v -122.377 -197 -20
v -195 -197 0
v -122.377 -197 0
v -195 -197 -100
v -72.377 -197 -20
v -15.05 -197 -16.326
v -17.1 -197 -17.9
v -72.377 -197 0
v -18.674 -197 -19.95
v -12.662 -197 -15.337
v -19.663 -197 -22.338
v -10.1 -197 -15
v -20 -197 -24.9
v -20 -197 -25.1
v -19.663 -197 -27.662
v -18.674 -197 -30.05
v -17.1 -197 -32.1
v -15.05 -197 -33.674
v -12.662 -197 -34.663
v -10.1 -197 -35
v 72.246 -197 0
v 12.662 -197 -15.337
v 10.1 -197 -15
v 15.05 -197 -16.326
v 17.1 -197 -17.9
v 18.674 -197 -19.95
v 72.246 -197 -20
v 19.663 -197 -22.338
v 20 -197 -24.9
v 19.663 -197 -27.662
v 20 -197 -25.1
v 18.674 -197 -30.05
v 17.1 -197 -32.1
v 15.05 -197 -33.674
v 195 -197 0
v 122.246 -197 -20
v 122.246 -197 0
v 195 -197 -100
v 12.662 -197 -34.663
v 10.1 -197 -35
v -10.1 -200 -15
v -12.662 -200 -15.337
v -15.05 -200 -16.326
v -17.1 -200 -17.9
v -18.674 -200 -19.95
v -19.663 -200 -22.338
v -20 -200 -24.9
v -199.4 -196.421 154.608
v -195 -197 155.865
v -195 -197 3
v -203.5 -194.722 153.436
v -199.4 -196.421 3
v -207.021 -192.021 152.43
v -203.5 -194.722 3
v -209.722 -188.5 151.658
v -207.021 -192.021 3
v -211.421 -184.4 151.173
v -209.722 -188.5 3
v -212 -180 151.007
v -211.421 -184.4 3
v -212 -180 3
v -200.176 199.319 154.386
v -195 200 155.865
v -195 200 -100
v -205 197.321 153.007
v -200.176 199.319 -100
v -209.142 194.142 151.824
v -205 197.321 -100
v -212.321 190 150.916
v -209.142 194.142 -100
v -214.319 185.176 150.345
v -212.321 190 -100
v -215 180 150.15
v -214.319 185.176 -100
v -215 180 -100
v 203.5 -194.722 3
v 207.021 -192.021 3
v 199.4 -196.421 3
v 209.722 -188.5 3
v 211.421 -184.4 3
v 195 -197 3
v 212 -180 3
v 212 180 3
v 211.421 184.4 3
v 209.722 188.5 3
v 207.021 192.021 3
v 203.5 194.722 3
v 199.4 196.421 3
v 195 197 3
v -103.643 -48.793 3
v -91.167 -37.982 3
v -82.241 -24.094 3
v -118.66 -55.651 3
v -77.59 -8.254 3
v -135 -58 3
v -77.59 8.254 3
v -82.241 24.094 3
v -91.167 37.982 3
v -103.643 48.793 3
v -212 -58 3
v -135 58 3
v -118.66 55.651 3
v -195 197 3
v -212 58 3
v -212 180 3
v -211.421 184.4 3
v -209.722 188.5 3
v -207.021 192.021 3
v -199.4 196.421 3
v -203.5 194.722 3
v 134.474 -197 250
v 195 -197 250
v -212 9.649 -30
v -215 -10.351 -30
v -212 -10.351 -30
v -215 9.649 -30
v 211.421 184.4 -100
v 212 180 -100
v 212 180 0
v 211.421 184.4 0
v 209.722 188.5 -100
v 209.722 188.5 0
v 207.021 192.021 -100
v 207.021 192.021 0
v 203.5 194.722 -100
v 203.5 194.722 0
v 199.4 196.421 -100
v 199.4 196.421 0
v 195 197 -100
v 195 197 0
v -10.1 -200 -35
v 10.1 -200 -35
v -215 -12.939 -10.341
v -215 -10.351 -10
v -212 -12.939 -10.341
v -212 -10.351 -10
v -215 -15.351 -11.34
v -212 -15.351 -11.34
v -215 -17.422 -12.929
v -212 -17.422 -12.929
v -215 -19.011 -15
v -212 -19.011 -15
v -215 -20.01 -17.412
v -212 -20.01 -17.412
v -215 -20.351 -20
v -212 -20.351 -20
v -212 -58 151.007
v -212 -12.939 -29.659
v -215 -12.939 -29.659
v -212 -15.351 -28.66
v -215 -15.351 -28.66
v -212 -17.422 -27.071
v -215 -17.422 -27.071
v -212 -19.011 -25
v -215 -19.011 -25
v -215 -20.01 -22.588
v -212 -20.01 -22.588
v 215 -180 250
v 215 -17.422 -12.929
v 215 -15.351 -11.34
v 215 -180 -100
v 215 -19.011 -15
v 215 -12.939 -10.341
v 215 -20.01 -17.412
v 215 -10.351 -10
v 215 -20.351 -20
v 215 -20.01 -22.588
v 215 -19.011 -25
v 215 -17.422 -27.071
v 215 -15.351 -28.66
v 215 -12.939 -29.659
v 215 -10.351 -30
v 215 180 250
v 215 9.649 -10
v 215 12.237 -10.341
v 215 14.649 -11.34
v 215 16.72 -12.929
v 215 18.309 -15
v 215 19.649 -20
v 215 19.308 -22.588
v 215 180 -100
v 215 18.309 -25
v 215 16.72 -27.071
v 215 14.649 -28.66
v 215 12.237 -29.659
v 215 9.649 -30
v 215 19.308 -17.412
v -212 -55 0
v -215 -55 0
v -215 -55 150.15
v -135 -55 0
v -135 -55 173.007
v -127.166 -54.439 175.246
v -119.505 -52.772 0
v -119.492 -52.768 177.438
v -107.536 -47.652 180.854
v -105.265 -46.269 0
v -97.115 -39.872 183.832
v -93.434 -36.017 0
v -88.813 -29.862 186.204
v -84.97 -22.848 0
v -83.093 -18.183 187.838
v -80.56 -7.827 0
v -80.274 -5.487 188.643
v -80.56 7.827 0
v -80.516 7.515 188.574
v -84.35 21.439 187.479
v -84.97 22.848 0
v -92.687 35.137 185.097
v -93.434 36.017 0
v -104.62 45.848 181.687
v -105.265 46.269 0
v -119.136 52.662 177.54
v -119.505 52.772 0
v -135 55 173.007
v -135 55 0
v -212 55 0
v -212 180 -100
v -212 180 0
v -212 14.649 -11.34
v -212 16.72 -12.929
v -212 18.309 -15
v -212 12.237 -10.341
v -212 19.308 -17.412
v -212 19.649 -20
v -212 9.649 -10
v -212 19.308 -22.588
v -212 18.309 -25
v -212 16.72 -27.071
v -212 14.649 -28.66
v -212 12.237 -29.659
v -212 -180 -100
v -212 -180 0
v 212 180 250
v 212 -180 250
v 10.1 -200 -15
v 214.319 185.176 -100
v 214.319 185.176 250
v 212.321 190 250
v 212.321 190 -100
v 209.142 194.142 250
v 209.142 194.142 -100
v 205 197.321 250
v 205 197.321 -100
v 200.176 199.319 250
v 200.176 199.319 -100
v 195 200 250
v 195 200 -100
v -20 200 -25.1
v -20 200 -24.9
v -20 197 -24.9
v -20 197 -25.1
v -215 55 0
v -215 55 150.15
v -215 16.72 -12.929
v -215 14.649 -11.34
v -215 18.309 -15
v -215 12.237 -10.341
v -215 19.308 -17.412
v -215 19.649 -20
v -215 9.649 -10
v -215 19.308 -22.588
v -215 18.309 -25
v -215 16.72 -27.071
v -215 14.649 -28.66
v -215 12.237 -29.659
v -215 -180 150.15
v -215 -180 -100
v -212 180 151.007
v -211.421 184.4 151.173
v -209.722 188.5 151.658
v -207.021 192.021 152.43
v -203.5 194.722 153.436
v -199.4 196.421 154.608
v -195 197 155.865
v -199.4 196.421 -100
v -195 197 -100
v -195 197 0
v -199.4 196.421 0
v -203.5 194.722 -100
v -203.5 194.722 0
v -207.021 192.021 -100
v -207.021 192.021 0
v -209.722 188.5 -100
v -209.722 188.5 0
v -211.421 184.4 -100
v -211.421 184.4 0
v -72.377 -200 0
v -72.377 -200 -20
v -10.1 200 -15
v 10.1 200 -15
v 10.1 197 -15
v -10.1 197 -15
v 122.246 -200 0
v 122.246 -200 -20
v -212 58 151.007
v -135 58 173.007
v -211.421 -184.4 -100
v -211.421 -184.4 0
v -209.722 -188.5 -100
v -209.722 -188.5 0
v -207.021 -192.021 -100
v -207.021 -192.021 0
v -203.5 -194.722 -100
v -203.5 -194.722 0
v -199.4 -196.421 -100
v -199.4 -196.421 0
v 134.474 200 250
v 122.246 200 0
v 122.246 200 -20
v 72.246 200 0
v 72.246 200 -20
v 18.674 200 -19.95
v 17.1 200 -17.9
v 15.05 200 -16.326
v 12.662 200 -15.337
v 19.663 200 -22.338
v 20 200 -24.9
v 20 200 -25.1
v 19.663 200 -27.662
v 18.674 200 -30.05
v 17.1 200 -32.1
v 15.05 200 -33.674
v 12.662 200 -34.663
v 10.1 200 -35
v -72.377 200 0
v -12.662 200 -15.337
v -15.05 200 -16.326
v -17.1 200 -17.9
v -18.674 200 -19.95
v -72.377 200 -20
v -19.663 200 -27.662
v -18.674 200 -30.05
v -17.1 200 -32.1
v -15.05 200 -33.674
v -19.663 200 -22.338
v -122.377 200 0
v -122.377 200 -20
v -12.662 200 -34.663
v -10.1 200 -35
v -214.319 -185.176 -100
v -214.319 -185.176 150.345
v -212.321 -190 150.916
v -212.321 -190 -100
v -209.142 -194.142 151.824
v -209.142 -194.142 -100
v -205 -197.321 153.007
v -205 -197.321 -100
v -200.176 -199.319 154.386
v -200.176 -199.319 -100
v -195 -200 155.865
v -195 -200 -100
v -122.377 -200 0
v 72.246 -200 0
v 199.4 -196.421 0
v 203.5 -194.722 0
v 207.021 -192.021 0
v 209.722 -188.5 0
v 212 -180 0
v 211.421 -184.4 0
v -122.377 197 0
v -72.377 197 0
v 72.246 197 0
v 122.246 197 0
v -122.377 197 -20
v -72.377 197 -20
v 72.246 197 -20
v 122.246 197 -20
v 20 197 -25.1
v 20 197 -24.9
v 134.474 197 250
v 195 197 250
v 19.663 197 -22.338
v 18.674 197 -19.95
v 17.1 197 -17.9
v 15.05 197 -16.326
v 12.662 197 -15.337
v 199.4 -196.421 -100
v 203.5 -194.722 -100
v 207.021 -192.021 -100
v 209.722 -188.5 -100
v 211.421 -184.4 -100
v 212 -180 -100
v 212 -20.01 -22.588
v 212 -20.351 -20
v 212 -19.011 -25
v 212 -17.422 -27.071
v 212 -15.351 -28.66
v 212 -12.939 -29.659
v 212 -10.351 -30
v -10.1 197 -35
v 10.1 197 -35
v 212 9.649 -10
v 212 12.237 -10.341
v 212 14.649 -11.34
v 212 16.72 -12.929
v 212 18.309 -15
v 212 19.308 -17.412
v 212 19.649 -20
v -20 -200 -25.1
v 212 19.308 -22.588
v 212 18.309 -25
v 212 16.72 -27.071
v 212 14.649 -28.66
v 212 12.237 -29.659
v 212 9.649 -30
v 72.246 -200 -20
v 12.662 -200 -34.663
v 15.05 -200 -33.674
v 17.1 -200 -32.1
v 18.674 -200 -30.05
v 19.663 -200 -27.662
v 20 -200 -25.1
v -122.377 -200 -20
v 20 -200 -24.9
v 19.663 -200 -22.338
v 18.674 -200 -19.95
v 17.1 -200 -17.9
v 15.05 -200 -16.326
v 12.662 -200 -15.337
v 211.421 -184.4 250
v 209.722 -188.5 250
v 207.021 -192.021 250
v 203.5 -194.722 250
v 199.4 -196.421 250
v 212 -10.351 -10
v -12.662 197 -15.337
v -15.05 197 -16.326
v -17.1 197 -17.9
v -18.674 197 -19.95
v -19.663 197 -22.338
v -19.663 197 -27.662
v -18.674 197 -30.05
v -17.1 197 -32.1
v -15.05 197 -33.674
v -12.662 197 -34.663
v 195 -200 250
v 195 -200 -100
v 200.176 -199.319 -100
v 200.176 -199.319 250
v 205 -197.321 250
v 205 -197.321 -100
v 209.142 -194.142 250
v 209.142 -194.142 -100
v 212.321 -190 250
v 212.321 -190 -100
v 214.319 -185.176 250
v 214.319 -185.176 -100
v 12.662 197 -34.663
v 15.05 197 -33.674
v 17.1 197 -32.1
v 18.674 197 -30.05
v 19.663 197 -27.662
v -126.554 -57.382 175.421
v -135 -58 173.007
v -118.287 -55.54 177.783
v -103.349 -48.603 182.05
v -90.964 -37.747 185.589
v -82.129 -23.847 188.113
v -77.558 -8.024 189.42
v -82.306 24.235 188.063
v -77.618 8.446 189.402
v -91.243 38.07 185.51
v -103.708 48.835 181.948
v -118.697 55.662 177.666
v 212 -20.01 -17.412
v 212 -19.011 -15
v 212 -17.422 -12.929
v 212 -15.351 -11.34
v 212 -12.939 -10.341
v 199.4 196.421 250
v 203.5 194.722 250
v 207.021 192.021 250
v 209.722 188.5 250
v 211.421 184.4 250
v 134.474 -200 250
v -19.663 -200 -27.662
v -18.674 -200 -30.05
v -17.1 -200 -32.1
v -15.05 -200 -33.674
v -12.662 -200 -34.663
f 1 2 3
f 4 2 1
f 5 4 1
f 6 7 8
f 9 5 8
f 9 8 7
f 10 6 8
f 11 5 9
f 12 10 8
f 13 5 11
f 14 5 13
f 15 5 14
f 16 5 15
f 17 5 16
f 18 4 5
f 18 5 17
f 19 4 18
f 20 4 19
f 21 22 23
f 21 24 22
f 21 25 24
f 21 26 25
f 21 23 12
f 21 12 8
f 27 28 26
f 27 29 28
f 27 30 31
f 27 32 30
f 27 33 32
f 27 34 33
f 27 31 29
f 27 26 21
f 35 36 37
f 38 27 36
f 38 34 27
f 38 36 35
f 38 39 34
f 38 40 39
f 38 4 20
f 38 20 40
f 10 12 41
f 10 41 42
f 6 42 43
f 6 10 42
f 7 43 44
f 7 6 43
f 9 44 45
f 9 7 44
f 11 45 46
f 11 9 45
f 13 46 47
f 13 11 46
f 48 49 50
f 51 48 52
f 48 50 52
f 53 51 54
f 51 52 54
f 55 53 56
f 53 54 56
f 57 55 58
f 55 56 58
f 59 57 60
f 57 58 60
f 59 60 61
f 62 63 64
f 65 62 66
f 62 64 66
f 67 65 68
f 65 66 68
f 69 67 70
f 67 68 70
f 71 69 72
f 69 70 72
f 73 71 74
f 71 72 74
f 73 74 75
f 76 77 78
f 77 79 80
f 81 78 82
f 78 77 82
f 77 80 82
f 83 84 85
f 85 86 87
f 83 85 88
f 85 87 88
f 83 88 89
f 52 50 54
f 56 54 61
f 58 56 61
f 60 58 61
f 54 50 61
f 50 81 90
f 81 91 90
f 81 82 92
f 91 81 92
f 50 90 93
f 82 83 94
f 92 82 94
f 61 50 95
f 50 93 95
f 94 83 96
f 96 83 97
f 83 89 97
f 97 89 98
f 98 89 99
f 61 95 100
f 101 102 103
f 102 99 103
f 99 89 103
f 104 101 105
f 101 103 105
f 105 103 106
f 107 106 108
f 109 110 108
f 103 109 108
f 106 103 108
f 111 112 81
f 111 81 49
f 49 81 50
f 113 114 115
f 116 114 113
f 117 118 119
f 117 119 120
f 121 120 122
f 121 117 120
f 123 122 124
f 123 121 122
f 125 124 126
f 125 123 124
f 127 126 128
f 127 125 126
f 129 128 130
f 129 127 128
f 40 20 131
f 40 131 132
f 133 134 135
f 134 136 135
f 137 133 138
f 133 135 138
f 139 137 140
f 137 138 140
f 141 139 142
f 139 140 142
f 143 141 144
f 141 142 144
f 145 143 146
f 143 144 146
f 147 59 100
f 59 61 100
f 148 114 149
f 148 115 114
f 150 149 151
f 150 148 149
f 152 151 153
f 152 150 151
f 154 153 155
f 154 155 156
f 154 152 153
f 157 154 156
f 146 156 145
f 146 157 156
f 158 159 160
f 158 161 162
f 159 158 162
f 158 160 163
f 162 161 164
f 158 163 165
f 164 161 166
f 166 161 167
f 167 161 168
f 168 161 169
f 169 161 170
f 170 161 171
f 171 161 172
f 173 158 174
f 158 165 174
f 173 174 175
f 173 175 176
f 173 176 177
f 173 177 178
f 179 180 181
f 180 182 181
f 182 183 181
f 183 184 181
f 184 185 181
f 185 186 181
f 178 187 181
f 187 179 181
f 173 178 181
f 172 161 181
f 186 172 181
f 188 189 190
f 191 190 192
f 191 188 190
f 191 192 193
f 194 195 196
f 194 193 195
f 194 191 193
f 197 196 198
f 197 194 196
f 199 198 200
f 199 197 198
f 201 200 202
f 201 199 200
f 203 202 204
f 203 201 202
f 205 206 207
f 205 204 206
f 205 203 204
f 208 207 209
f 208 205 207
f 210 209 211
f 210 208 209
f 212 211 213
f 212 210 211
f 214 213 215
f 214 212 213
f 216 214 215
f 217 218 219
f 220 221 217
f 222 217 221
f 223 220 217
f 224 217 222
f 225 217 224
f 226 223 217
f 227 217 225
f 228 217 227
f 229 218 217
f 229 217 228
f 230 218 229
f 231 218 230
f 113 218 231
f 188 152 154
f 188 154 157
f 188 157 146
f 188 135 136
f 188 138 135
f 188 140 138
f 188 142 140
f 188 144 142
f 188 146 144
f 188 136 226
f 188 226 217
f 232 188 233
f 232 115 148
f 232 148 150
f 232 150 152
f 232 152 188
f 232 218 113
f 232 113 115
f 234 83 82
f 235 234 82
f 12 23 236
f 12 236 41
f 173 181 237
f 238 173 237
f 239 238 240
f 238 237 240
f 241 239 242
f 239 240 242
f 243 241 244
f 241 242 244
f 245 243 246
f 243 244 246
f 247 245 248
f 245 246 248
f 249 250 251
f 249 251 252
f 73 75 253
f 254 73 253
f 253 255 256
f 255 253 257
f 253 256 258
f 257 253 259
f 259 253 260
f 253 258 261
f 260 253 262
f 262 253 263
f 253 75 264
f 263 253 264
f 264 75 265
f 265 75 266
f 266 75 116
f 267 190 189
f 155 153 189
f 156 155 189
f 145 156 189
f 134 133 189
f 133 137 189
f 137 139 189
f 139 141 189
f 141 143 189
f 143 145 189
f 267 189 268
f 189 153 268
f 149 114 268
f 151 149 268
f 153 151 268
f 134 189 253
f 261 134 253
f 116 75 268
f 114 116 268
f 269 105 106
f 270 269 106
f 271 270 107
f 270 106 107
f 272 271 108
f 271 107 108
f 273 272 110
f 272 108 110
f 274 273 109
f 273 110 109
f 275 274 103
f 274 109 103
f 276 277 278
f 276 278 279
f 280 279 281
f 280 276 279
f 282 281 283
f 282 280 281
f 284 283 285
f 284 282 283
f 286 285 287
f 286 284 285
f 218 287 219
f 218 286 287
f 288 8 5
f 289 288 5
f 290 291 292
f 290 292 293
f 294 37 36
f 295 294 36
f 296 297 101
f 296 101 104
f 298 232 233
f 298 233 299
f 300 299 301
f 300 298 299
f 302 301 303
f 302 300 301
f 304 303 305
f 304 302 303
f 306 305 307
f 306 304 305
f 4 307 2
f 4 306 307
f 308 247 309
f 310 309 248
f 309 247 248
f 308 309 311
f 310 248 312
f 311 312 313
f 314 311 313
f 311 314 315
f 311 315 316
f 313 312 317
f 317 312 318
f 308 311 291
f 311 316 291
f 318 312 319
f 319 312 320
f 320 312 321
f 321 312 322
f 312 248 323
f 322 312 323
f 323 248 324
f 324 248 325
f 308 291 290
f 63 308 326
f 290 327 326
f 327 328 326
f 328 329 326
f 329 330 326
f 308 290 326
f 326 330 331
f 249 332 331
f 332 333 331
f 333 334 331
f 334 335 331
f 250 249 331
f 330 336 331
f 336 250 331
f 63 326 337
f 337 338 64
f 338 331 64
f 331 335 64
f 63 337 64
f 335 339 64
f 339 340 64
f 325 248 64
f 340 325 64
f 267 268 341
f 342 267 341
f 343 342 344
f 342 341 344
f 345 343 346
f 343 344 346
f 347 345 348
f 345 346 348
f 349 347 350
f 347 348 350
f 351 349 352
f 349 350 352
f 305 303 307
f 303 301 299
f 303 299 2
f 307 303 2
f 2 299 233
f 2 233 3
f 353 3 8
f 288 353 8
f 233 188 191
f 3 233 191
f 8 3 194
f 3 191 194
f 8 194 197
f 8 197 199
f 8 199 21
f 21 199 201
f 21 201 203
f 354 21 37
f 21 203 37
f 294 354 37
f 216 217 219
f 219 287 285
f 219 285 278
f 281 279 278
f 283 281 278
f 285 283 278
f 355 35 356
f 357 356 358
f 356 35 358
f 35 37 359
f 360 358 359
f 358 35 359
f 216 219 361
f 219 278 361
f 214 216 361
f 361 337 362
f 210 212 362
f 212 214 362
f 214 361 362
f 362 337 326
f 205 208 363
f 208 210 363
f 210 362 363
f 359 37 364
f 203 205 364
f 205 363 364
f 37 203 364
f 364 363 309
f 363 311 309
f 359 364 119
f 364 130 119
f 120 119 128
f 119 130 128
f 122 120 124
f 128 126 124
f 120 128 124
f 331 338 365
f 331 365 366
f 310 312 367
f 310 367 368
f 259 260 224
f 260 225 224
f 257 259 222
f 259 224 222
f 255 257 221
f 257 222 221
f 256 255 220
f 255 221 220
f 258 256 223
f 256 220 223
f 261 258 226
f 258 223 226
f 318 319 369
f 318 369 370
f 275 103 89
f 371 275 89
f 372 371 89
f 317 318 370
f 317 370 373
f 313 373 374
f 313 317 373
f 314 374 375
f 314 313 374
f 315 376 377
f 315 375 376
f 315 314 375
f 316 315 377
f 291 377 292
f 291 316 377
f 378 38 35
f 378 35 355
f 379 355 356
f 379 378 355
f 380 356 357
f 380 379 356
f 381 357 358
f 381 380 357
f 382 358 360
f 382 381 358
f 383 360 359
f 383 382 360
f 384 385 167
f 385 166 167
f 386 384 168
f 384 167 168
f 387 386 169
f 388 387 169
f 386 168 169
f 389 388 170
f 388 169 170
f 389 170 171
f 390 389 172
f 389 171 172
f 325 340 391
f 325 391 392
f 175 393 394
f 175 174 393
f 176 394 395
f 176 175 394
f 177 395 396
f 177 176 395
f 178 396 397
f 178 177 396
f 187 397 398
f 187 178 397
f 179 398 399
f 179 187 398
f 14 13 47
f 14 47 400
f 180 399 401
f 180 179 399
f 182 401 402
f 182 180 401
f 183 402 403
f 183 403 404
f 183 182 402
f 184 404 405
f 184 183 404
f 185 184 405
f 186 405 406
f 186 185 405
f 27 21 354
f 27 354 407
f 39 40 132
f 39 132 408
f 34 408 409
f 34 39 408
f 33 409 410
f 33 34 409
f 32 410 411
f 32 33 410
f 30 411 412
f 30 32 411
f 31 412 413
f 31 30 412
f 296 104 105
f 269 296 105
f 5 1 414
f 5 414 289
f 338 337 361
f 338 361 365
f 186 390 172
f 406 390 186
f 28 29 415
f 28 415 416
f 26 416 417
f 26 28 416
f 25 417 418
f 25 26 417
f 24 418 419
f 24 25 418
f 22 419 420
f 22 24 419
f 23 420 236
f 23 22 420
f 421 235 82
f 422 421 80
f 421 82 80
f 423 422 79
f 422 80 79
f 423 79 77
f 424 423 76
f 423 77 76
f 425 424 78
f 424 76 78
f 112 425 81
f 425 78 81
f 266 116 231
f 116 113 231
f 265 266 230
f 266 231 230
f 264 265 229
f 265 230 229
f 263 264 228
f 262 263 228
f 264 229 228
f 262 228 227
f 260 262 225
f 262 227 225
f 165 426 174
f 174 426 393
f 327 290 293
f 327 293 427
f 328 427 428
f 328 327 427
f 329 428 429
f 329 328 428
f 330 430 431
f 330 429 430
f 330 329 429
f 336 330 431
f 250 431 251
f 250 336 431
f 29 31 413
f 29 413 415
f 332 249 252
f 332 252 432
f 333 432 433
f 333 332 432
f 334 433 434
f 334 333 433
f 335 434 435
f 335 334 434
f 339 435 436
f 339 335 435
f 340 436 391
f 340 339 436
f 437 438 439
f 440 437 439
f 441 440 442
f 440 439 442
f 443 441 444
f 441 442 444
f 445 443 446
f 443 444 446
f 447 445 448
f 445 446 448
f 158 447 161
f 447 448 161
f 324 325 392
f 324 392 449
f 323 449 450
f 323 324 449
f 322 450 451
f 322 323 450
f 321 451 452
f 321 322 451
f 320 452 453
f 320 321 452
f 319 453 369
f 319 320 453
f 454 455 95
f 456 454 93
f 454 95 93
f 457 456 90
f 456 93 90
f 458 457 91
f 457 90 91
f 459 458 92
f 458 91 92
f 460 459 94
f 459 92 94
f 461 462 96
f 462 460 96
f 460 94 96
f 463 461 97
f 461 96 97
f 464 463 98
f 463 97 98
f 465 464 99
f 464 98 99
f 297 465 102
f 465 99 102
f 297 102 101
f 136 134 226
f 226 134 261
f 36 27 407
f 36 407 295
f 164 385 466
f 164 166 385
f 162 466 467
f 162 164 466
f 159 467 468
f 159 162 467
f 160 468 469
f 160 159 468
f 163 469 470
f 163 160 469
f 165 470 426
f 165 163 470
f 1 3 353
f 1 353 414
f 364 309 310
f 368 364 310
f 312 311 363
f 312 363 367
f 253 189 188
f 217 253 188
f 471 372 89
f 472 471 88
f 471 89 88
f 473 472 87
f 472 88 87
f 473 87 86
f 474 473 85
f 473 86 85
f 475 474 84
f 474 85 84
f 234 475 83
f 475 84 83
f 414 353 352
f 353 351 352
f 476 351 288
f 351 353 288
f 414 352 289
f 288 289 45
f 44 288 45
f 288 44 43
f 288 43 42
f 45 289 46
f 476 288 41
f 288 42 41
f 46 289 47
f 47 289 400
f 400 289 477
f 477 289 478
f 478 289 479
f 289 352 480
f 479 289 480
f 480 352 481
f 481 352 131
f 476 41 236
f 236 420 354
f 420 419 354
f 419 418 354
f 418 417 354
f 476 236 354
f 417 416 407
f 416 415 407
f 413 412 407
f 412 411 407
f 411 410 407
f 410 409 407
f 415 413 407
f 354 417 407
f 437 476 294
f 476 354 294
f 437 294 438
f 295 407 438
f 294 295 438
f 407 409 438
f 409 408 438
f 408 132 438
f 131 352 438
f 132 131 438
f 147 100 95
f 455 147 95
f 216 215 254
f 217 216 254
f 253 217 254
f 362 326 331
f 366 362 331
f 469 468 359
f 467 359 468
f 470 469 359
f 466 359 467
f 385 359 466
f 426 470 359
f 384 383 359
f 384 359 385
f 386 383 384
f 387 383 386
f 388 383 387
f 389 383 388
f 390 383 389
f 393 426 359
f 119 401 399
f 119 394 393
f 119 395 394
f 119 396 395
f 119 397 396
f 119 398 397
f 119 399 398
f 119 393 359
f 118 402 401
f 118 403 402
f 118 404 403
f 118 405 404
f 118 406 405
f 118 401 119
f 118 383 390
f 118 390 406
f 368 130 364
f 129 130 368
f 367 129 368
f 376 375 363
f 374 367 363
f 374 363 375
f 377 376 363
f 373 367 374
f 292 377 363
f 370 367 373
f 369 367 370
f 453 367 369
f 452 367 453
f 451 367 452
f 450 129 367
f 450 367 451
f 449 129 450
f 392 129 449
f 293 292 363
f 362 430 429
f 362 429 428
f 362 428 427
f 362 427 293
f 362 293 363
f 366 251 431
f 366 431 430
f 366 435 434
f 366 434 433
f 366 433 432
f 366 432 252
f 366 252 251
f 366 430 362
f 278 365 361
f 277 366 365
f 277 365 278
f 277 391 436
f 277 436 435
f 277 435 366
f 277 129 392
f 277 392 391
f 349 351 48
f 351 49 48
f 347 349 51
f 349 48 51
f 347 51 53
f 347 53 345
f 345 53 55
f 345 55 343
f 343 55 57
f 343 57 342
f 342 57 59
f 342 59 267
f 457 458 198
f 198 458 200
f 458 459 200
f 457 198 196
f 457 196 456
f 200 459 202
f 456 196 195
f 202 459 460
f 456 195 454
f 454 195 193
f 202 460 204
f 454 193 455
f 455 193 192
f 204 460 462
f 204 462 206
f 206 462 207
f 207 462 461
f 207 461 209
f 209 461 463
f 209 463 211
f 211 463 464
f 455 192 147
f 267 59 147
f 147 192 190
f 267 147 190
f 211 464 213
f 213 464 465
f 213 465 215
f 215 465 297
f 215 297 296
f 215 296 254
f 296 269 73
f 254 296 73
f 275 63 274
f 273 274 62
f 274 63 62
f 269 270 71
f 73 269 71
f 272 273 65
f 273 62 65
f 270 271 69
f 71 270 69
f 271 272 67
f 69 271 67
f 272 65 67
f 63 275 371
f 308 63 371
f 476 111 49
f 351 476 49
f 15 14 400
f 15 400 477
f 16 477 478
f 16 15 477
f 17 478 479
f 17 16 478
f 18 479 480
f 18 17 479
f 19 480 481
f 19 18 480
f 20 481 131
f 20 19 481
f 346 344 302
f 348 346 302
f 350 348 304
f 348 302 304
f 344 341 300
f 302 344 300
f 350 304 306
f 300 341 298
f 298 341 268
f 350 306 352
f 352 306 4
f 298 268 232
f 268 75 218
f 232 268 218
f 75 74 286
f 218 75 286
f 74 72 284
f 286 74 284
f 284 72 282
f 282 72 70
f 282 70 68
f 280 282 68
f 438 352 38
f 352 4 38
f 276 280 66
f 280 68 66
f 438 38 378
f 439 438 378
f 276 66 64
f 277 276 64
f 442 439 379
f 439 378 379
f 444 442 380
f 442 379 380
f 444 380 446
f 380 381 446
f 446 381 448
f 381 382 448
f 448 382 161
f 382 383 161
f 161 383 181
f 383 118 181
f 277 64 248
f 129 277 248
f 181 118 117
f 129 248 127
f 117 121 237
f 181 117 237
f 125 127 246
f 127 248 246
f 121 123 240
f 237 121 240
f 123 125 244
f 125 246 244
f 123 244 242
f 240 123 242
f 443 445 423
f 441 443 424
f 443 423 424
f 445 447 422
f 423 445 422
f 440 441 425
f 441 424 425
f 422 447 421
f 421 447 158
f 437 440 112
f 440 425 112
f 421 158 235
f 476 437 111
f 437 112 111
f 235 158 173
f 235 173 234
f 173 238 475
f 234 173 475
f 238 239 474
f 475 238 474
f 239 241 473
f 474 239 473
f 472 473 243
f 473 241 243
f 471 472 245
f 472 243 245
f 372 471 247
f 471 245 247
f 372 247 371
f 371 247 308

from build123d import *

# Parameters (mm, degrees)
EXTRUDE_1_DEPTH     = 250
SHELL_1_T           = -3
CUT_EXTRUDE_1_DEPTH = 547
EXTRUDE_START       = 100
EXTRUDE_3_DEPTH     = 100
SKETCH_6_W          = 50
SKETCH_6_H          = 20
CUT_EXTRUDE_3_DEPTH = 472
SKETCH_7_W          = 20
SKETCH_7_H          = 40
CUT_EXTRUDE_4_DEPTH = 472
FILLET_1_R          = 10
FILLET_2_R          = 10
CUT_EXTRUDE_5_DEPTH = 472


with BuildPart() as part:
    # 草图1 → 凸台-拉伸1 (new body)
    with BuildSketch(Plane.XY):
        with BuildLine():
            Line((-135, 55), (-215, 55))
            Line((-215, 55), (-215, 180))
            ThreePointArc((-215, 180), (-209.142135624, 194.142135624), (-195, 200))
            Line((-195, 200), (195, 200))
            ThreePointArc((195, 200), (209.142135624, 194.142135624), (215, 180))
            Line((215, 180), (215, -180))
            ThreePointArc((215, -180), (209.142135624, -194.142135624), (195, -200))
            Line((195, -200), (-195, -200))
            ThreePointArc((-195, -200), (-209.142135624, -194.142135624), (-215, -180))
            Line((-215, -180), (-215, -55))
            Line((-215, -55), (-135, -55))
            ThreePointArc((-135, -55), (-80, 0), (-135, 55))
        make_face()
    extrude(amount=EXTRUDE_1_DEPTH)

    # 抽壳1
    shell_1_openings = [part.faces().sort_by_distance(p)[0] for p in [
        (13.096091643, 0, 250),
    ]]
    offset(amount=SHELL_1_T, openings=shell_1_openings, kind=Kind.INTERSECTION)

    # 草图3 → 切除-拉伸1 (cut)
    with BuildSketch(Plane(origin=(0, 200, 0), x_dir=(1, 0, 0), z_dir=(0, 1, 0))):
        Polygon((134.47381547, -250), (-215.52618453, -150), (-215.52618453, -250), align=None)
    extrude(amount=-CUT_EXTRUDE_1_DEPTH, mode=Mode.SUBTRACT)

    # 草图4 → 凸台-拉伸3 (add)
    with BuildSketch(Plane(origin=(0, 0, 0), x_dir=(-1, 0, 0), z_dir=(0, 0, -1)).offset(EXTRUDE_START)):
        with BuildLine():
            Line((195, -200), (-195, -200))
            ThreePointArc((-195, -200), (-209.142135624, -194.142135624), (-215, -180))
            Line((-215, -180), (-215, 180))
            ThreePointArc((-215, 180), (-209.142135624, 194.142135624), (-195, 200))
            Line((-195, 200), (195, 200))
            ThreePointArc((195, 200), (209.142135624, 194.142135624), (215, 180))
            Line((215, 180), (215, -180))
            ThreePointArc((215, -180), (209.142135624, -194.142135624), (195, -200))
        make_face()
        with BuildLine():
            Line((195, -197), (-195, -197))
            ThreePointArc((-195, -197), (-207.02081528, -192.02081528), (-212, -180))
            Line((-212, -180), (-212, 180))
            ThreePointArc((-212, 180), (-207.02081528, 192.02081528), (-195, 197))
            Line((-195, 197), (195, 197))
            ThreePointArc((195, 197), (207.02081528, 192.02081528), (212, 180))
            Line((212, 180), (212, -180))
            ThreePointArc((212, -180), (207.02081528, -192.02081528), (195, -197))
        make_face(mode=Mode.SUBTRACT)
    extrude(amount=-EXTRUDE_3_DEPTH)

    # 草图6 → 切除-拉伸3 (cut)
    with BuildSketch(Plane(origin=(0, 200, 0), x_dir=(1, 0, 0), z_dir=(0, 1, 0))):
        with Locations((-97.377223929, 10)):
            Rectangle(SKETCH_6_W, SKETCH_6_H)
        with Locations((97.246218359, 10)):
            Rectangle(SKETCH_6_W, SKETCH_6_H)
    extrude(amount=-CUT_EXTRUDE_3_DEPTH, mode=Mode.SUBTRACT)

    # 草图7 → 切除-拉伸4 (cut)
    with BuildSketch(Plane.ZY.offset(215)):
        with Locations((-20, -0.350965312)):
            Rectangle(SKETCH_7_W, SKETCH_7_H)
    extrude(amount=-CUT_EXTRUDE_4_DEPTH, mode=Mode.SUBTRACT)

    # 圆角1
    fillet_1_edges = [part.edges().sort_by_distance(p)[0] for p in [
        (-213.5, -20.350965312, -30),
        (-213.5, -20.350965312, -10),
        (-213.5, 19.649034688, -10),
        (-213.5, 19.649034688, -30),
    ]]
    fillet(fillet_1_edges, radius=FILLET_1_R - 0.0001)  # a hair under: the kernel refuses the full size

    # 圆角2
    fillet_2_edges = [part.edges().sort_by_distance(p)[0] for p in [
        (213.5, -20.350965312, -30),
        (213.5, 19.649034688, -30),
        (213.5, 19.649034688, -10),
        (213.5, -20.350965312, -10),
    ]]
    fillet(fillet_2_edges, radius=FILLET_2_R - 0.0001)  # a hair under: the kernel refuses the full size

    # 草图8 → 切除-拉伸5 (cut)
    with BuildSketch(Plane(origin=(0, 200, 0), x_dir=(1, 0, 0), z_dir=(0, 1, 0))):
        with BuildLine():
            Line((10.1, 15), (-10.1, 15))
            ThreePointArc((-10.1, 15), (-17.100357134, 17.899642866), (-20, 24.9))
            Line((-20, 24.9), (-20, 25.1))
            ThreePointArc((-20, 25.1), (-17.100357134, 32.100357134), (-10.1, 35))
            Line((-10.1, 35), (10.1, 35))
            ThreePointArc((10.1, 35), (17.100357134, 32.100357134), (20, 25.1))
            Line((20, 25.1), (20, 24.9))
            ThreePointArc((20, 24.9), (17.100357134, 17.899642866), (10.1, 15))
        make_face()
    extrude(amount=-CUT_EXTRUDE_5_DEPTH, mode=Mode.SUBTRACT)


solid = part.part
